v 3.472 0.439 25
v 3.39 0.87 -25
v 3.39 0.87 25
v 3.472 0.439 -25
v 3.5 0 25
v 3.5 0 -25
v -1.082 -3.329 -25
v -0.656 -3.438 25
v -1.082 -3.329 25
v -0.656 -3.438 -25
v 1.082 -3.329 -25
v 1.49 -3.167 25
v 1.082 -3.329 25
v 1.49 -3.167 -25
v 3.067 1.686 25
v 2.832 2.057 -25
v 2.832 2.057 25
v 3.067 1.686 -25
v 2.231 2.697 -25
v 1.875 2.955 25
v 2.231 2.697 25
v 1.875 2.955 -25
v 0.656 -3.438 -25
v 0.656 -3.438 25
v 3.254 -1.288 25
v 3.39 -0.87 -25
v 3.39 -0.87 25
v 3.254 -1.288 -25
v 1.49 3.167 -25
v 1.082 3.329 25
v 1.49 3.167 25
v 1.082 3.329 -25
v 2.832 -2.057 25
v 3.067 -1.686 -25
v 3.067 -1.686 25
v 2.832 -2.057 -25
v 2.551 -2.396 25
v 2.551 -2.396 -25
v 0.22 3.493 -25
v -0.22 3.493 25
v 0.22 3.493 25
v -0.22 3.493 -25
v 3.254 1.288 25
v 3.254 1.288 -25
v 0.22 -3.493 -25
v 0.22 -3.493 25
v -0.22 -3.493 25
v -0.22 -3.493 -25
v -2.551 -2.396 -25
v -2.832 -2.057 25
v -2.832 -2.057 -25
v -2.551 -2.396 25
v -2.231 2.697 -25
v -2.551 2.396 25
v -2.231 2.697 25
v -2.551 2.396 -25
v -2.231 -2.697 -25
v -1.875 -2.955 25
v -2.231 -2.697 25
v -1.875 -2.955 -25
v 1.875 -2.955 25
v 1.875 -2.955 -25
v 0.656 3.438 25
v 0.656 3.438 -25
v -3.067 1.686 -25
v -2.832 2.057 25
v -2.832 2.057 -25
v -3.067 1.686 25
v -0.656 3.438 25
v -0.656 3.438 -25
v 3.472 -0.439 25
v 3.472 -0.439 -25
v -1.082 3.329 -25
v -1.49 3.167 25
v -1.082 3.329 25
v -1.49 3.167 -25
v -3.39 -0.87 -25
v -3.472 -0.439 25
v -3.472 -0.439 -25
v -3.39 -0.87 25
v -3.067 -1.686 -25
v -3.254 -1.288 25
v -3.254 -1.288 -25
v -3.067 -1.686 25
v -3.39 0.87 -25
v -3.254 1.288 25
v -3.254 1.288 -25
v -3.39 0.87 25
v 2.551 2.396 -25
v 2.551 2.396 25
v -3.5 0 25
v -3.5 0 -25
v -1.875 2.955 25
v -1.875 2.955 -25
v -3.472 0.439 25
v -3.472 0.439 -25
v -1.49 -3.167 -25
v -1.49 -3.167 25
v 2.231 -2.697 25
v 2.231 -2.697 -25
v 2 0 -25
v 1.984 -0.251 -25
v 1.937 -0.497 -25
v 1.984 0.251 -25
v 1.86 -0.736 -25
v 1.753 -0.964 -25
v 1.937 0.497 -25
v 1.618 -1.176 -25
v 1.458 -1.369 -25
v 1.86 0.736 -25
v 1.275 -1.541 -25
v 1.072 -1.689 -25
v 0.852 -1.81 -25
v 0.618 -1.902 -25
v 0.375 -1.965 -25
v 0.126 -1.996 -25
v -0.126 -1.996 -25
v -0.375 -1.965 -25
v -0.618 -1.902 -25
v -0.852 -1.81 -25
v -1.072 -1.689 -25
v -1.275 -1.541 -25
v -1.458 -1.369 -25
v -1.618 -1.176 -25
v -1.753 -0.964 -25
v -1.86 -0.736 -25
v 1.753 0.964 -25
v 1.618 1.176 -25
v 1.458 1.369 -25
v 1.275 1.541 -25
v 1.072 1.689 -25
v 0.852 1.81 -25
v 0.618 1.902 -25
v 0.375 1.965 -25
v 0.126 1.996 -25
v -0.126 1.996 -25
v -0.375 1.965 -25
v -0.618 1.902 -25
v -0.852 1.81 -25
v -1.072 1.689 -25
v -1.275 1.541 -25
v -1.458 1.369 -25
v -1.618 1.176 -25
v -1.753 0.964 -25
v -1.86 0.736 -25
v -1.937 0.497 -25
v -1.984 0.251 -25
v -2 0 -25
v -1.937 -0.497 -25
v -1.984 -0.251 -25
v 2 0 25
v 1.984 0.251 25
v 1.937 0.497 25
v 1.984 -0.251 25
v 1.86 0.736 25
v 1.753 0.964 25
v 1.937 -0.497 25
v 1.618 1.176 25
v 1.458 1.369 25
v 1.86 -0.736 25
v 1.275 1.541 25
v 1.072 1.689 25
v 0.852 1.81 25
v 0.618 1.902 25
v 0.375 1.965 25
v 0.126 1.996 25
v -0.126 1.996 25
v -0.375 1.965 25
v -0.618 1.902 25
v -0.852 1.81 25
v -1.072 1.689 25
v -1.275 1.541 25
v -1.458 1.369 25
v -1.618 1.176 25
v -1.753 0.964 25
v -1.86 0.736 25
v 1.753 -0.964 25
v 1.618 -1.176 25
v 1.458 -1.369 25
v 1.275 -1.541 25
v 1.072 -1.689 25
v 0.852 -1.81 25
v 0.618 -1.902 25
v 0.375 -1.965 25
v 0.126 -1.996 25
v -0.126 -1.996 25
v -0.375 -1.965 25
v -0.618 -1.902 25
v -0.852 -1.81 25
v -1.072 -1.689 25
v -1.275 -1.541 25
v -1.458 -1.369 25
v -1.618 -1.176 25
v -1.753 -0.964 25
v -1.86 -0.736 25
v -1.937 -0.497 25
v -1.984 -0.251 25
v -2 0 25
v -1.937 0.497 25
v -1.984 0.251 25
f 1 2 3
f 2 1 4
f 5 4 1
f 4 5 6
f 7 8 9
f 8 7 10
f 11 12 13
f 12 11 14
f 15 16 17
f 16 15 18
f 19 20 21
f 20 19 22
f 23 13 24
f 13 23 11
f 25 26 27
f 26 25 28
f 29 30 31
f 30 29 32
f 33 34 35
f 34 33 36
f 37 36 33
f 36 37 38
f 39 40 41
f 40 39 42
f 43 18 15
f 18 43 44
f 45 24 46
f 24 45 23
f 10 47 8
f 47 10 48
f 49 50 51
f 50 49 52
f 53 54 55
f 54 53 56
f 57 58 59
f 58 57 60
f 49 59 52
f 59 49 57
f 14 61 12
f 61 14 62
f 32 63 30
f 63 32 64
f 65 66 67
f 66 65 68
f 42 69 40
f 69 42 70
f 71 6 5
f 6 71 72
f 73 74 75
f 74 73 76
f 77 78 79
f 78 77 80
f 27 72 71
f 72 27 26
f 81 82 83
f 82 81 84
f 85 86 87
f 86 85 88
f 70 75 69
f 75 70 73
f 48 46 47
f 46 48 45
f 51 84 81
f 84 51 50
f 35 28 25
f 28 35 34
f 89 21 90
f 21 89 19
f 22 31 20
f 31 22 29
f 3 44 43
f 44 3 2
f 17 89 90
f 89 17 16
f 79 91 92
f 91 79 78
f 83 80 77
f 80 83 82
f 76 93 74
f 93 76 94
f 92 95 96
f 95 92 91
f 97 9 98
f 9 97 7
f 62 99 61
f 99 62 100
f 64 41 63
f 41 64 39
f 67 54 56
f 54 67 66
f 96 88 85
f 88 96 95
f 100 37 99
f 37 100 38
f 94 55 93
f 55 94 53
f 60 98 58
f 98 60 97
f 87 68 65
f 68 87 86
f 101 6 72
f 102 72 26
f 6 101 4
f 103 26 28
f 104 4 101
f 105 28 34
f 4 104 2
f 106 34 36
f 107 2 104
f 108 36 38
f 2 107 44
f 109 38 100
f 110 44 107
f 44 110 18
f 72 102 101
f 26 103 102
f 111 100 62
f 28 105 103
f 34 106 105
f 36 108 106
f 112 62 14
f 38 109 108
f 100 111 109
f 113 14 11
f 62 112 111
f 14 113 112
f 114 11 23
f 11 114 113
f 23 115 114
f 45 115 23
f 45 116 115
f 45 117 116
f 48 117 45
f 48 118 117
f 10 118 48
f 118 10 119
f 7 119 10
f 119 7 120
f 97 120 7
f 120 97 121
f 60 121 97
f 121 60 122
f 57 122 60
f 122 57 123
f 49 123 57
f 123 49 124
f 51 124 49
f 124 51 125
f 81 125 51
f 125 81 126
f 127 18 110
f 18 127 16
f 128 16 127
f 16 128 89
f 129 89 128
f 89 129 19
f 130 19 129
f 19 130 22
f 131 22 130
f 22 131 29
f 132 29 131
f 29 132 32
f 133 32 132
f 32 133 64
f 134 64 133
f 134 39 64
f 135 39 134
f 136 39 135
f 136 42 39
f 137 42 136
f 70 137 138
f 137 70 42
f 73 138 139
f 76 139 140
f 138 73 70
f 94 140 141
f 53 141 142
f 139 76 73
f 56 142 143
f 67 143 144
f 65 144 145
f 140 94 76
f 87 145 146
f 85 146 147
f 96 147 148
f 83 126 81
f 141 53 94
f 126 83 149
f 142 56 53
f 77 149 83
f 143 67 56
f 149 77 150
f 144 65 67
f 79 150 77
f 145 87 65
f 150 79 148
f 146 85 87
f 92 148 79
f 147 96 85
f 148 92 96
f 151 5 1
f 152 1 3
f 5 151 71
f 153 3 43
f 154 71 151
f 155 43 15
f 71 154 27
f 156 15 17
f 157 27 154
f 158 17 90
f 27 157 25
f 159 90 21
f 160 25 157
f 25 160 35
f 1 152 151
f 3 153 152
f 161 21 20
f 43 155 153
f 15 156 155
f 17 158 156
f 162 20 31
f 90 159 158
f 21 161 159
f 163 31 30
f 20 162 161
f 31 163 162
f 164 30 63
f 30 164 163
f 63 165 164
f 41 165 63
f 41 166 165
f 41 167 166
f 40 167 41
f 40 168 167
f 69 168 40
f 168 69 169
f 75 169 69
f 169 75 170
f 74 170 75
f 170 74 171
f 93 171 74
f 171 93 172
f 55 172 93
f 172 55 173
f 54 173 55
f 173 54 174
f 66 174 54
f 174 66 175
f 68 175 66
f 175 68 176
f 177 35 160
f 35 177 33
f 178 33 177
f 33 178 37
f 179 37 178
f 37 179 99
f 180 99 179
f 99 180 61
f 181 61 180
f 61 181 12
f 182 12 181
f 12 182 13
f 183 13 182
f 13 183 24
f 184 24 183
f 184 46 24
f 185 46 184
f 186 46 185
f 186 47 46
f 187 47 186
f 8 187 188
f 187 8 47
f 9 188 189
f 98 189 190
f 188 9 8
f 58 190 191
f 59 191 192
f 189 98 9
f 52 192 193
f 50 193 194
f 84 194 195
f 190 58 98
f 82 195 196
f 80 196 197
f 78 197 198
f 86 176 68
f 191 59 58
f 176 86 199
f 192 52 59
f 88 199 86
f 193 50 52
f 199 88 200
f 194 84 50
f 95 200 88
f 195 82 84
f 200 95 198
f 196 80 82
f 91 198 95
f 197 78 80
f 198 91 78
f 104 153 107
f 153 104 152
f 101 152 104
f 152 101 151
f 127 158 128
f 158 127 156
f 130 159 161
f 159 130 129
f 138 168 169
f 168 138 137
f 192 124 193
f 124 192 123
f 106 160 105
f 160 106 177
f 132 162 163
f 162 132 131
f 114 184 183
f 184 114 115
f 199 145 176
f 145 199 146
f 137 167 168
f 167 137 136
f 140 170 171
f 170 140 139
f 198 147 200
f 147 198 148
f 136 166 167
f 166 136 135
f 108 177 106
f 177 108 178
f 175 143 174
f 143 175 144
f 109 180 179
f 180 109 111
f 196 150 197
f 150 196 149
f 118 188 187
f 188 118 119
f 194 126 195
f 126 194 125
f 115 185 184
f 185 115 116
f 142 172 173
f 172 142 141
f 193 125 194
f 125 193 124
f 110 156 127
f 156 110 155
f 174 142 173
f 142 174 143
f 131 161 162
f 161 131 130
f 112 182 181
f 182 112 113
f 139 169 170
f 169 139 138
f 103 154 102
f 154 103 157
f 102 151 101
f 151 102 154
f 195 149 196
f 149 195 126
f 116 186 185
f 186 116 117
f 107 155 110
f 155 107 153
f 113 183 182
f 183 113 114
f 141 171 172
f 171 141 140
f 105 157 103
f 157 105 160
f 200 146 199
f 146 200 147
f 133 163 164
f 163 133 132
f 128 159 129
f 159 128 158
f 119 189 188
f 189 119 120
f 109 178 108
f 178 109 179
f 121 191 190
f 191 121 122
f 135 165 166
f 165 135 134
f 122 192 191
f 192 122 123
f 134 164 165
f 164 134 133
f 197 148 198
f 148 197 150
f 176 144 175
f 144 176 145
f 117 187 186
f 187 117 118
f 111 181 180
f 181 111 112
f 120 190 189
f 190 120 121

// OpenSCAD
$fn = 50;


difference() {
	union() {
		translate(v = [0, 0, -25.0000000000]) {
			cylinder(h = 50, r = 3.5000000000);
		}
	}
	union() {
		translate(v = [0, 0, -100.0000000000]) {
			cylinder(h = 200, r = 2.0000000000);
		}
	}
}
